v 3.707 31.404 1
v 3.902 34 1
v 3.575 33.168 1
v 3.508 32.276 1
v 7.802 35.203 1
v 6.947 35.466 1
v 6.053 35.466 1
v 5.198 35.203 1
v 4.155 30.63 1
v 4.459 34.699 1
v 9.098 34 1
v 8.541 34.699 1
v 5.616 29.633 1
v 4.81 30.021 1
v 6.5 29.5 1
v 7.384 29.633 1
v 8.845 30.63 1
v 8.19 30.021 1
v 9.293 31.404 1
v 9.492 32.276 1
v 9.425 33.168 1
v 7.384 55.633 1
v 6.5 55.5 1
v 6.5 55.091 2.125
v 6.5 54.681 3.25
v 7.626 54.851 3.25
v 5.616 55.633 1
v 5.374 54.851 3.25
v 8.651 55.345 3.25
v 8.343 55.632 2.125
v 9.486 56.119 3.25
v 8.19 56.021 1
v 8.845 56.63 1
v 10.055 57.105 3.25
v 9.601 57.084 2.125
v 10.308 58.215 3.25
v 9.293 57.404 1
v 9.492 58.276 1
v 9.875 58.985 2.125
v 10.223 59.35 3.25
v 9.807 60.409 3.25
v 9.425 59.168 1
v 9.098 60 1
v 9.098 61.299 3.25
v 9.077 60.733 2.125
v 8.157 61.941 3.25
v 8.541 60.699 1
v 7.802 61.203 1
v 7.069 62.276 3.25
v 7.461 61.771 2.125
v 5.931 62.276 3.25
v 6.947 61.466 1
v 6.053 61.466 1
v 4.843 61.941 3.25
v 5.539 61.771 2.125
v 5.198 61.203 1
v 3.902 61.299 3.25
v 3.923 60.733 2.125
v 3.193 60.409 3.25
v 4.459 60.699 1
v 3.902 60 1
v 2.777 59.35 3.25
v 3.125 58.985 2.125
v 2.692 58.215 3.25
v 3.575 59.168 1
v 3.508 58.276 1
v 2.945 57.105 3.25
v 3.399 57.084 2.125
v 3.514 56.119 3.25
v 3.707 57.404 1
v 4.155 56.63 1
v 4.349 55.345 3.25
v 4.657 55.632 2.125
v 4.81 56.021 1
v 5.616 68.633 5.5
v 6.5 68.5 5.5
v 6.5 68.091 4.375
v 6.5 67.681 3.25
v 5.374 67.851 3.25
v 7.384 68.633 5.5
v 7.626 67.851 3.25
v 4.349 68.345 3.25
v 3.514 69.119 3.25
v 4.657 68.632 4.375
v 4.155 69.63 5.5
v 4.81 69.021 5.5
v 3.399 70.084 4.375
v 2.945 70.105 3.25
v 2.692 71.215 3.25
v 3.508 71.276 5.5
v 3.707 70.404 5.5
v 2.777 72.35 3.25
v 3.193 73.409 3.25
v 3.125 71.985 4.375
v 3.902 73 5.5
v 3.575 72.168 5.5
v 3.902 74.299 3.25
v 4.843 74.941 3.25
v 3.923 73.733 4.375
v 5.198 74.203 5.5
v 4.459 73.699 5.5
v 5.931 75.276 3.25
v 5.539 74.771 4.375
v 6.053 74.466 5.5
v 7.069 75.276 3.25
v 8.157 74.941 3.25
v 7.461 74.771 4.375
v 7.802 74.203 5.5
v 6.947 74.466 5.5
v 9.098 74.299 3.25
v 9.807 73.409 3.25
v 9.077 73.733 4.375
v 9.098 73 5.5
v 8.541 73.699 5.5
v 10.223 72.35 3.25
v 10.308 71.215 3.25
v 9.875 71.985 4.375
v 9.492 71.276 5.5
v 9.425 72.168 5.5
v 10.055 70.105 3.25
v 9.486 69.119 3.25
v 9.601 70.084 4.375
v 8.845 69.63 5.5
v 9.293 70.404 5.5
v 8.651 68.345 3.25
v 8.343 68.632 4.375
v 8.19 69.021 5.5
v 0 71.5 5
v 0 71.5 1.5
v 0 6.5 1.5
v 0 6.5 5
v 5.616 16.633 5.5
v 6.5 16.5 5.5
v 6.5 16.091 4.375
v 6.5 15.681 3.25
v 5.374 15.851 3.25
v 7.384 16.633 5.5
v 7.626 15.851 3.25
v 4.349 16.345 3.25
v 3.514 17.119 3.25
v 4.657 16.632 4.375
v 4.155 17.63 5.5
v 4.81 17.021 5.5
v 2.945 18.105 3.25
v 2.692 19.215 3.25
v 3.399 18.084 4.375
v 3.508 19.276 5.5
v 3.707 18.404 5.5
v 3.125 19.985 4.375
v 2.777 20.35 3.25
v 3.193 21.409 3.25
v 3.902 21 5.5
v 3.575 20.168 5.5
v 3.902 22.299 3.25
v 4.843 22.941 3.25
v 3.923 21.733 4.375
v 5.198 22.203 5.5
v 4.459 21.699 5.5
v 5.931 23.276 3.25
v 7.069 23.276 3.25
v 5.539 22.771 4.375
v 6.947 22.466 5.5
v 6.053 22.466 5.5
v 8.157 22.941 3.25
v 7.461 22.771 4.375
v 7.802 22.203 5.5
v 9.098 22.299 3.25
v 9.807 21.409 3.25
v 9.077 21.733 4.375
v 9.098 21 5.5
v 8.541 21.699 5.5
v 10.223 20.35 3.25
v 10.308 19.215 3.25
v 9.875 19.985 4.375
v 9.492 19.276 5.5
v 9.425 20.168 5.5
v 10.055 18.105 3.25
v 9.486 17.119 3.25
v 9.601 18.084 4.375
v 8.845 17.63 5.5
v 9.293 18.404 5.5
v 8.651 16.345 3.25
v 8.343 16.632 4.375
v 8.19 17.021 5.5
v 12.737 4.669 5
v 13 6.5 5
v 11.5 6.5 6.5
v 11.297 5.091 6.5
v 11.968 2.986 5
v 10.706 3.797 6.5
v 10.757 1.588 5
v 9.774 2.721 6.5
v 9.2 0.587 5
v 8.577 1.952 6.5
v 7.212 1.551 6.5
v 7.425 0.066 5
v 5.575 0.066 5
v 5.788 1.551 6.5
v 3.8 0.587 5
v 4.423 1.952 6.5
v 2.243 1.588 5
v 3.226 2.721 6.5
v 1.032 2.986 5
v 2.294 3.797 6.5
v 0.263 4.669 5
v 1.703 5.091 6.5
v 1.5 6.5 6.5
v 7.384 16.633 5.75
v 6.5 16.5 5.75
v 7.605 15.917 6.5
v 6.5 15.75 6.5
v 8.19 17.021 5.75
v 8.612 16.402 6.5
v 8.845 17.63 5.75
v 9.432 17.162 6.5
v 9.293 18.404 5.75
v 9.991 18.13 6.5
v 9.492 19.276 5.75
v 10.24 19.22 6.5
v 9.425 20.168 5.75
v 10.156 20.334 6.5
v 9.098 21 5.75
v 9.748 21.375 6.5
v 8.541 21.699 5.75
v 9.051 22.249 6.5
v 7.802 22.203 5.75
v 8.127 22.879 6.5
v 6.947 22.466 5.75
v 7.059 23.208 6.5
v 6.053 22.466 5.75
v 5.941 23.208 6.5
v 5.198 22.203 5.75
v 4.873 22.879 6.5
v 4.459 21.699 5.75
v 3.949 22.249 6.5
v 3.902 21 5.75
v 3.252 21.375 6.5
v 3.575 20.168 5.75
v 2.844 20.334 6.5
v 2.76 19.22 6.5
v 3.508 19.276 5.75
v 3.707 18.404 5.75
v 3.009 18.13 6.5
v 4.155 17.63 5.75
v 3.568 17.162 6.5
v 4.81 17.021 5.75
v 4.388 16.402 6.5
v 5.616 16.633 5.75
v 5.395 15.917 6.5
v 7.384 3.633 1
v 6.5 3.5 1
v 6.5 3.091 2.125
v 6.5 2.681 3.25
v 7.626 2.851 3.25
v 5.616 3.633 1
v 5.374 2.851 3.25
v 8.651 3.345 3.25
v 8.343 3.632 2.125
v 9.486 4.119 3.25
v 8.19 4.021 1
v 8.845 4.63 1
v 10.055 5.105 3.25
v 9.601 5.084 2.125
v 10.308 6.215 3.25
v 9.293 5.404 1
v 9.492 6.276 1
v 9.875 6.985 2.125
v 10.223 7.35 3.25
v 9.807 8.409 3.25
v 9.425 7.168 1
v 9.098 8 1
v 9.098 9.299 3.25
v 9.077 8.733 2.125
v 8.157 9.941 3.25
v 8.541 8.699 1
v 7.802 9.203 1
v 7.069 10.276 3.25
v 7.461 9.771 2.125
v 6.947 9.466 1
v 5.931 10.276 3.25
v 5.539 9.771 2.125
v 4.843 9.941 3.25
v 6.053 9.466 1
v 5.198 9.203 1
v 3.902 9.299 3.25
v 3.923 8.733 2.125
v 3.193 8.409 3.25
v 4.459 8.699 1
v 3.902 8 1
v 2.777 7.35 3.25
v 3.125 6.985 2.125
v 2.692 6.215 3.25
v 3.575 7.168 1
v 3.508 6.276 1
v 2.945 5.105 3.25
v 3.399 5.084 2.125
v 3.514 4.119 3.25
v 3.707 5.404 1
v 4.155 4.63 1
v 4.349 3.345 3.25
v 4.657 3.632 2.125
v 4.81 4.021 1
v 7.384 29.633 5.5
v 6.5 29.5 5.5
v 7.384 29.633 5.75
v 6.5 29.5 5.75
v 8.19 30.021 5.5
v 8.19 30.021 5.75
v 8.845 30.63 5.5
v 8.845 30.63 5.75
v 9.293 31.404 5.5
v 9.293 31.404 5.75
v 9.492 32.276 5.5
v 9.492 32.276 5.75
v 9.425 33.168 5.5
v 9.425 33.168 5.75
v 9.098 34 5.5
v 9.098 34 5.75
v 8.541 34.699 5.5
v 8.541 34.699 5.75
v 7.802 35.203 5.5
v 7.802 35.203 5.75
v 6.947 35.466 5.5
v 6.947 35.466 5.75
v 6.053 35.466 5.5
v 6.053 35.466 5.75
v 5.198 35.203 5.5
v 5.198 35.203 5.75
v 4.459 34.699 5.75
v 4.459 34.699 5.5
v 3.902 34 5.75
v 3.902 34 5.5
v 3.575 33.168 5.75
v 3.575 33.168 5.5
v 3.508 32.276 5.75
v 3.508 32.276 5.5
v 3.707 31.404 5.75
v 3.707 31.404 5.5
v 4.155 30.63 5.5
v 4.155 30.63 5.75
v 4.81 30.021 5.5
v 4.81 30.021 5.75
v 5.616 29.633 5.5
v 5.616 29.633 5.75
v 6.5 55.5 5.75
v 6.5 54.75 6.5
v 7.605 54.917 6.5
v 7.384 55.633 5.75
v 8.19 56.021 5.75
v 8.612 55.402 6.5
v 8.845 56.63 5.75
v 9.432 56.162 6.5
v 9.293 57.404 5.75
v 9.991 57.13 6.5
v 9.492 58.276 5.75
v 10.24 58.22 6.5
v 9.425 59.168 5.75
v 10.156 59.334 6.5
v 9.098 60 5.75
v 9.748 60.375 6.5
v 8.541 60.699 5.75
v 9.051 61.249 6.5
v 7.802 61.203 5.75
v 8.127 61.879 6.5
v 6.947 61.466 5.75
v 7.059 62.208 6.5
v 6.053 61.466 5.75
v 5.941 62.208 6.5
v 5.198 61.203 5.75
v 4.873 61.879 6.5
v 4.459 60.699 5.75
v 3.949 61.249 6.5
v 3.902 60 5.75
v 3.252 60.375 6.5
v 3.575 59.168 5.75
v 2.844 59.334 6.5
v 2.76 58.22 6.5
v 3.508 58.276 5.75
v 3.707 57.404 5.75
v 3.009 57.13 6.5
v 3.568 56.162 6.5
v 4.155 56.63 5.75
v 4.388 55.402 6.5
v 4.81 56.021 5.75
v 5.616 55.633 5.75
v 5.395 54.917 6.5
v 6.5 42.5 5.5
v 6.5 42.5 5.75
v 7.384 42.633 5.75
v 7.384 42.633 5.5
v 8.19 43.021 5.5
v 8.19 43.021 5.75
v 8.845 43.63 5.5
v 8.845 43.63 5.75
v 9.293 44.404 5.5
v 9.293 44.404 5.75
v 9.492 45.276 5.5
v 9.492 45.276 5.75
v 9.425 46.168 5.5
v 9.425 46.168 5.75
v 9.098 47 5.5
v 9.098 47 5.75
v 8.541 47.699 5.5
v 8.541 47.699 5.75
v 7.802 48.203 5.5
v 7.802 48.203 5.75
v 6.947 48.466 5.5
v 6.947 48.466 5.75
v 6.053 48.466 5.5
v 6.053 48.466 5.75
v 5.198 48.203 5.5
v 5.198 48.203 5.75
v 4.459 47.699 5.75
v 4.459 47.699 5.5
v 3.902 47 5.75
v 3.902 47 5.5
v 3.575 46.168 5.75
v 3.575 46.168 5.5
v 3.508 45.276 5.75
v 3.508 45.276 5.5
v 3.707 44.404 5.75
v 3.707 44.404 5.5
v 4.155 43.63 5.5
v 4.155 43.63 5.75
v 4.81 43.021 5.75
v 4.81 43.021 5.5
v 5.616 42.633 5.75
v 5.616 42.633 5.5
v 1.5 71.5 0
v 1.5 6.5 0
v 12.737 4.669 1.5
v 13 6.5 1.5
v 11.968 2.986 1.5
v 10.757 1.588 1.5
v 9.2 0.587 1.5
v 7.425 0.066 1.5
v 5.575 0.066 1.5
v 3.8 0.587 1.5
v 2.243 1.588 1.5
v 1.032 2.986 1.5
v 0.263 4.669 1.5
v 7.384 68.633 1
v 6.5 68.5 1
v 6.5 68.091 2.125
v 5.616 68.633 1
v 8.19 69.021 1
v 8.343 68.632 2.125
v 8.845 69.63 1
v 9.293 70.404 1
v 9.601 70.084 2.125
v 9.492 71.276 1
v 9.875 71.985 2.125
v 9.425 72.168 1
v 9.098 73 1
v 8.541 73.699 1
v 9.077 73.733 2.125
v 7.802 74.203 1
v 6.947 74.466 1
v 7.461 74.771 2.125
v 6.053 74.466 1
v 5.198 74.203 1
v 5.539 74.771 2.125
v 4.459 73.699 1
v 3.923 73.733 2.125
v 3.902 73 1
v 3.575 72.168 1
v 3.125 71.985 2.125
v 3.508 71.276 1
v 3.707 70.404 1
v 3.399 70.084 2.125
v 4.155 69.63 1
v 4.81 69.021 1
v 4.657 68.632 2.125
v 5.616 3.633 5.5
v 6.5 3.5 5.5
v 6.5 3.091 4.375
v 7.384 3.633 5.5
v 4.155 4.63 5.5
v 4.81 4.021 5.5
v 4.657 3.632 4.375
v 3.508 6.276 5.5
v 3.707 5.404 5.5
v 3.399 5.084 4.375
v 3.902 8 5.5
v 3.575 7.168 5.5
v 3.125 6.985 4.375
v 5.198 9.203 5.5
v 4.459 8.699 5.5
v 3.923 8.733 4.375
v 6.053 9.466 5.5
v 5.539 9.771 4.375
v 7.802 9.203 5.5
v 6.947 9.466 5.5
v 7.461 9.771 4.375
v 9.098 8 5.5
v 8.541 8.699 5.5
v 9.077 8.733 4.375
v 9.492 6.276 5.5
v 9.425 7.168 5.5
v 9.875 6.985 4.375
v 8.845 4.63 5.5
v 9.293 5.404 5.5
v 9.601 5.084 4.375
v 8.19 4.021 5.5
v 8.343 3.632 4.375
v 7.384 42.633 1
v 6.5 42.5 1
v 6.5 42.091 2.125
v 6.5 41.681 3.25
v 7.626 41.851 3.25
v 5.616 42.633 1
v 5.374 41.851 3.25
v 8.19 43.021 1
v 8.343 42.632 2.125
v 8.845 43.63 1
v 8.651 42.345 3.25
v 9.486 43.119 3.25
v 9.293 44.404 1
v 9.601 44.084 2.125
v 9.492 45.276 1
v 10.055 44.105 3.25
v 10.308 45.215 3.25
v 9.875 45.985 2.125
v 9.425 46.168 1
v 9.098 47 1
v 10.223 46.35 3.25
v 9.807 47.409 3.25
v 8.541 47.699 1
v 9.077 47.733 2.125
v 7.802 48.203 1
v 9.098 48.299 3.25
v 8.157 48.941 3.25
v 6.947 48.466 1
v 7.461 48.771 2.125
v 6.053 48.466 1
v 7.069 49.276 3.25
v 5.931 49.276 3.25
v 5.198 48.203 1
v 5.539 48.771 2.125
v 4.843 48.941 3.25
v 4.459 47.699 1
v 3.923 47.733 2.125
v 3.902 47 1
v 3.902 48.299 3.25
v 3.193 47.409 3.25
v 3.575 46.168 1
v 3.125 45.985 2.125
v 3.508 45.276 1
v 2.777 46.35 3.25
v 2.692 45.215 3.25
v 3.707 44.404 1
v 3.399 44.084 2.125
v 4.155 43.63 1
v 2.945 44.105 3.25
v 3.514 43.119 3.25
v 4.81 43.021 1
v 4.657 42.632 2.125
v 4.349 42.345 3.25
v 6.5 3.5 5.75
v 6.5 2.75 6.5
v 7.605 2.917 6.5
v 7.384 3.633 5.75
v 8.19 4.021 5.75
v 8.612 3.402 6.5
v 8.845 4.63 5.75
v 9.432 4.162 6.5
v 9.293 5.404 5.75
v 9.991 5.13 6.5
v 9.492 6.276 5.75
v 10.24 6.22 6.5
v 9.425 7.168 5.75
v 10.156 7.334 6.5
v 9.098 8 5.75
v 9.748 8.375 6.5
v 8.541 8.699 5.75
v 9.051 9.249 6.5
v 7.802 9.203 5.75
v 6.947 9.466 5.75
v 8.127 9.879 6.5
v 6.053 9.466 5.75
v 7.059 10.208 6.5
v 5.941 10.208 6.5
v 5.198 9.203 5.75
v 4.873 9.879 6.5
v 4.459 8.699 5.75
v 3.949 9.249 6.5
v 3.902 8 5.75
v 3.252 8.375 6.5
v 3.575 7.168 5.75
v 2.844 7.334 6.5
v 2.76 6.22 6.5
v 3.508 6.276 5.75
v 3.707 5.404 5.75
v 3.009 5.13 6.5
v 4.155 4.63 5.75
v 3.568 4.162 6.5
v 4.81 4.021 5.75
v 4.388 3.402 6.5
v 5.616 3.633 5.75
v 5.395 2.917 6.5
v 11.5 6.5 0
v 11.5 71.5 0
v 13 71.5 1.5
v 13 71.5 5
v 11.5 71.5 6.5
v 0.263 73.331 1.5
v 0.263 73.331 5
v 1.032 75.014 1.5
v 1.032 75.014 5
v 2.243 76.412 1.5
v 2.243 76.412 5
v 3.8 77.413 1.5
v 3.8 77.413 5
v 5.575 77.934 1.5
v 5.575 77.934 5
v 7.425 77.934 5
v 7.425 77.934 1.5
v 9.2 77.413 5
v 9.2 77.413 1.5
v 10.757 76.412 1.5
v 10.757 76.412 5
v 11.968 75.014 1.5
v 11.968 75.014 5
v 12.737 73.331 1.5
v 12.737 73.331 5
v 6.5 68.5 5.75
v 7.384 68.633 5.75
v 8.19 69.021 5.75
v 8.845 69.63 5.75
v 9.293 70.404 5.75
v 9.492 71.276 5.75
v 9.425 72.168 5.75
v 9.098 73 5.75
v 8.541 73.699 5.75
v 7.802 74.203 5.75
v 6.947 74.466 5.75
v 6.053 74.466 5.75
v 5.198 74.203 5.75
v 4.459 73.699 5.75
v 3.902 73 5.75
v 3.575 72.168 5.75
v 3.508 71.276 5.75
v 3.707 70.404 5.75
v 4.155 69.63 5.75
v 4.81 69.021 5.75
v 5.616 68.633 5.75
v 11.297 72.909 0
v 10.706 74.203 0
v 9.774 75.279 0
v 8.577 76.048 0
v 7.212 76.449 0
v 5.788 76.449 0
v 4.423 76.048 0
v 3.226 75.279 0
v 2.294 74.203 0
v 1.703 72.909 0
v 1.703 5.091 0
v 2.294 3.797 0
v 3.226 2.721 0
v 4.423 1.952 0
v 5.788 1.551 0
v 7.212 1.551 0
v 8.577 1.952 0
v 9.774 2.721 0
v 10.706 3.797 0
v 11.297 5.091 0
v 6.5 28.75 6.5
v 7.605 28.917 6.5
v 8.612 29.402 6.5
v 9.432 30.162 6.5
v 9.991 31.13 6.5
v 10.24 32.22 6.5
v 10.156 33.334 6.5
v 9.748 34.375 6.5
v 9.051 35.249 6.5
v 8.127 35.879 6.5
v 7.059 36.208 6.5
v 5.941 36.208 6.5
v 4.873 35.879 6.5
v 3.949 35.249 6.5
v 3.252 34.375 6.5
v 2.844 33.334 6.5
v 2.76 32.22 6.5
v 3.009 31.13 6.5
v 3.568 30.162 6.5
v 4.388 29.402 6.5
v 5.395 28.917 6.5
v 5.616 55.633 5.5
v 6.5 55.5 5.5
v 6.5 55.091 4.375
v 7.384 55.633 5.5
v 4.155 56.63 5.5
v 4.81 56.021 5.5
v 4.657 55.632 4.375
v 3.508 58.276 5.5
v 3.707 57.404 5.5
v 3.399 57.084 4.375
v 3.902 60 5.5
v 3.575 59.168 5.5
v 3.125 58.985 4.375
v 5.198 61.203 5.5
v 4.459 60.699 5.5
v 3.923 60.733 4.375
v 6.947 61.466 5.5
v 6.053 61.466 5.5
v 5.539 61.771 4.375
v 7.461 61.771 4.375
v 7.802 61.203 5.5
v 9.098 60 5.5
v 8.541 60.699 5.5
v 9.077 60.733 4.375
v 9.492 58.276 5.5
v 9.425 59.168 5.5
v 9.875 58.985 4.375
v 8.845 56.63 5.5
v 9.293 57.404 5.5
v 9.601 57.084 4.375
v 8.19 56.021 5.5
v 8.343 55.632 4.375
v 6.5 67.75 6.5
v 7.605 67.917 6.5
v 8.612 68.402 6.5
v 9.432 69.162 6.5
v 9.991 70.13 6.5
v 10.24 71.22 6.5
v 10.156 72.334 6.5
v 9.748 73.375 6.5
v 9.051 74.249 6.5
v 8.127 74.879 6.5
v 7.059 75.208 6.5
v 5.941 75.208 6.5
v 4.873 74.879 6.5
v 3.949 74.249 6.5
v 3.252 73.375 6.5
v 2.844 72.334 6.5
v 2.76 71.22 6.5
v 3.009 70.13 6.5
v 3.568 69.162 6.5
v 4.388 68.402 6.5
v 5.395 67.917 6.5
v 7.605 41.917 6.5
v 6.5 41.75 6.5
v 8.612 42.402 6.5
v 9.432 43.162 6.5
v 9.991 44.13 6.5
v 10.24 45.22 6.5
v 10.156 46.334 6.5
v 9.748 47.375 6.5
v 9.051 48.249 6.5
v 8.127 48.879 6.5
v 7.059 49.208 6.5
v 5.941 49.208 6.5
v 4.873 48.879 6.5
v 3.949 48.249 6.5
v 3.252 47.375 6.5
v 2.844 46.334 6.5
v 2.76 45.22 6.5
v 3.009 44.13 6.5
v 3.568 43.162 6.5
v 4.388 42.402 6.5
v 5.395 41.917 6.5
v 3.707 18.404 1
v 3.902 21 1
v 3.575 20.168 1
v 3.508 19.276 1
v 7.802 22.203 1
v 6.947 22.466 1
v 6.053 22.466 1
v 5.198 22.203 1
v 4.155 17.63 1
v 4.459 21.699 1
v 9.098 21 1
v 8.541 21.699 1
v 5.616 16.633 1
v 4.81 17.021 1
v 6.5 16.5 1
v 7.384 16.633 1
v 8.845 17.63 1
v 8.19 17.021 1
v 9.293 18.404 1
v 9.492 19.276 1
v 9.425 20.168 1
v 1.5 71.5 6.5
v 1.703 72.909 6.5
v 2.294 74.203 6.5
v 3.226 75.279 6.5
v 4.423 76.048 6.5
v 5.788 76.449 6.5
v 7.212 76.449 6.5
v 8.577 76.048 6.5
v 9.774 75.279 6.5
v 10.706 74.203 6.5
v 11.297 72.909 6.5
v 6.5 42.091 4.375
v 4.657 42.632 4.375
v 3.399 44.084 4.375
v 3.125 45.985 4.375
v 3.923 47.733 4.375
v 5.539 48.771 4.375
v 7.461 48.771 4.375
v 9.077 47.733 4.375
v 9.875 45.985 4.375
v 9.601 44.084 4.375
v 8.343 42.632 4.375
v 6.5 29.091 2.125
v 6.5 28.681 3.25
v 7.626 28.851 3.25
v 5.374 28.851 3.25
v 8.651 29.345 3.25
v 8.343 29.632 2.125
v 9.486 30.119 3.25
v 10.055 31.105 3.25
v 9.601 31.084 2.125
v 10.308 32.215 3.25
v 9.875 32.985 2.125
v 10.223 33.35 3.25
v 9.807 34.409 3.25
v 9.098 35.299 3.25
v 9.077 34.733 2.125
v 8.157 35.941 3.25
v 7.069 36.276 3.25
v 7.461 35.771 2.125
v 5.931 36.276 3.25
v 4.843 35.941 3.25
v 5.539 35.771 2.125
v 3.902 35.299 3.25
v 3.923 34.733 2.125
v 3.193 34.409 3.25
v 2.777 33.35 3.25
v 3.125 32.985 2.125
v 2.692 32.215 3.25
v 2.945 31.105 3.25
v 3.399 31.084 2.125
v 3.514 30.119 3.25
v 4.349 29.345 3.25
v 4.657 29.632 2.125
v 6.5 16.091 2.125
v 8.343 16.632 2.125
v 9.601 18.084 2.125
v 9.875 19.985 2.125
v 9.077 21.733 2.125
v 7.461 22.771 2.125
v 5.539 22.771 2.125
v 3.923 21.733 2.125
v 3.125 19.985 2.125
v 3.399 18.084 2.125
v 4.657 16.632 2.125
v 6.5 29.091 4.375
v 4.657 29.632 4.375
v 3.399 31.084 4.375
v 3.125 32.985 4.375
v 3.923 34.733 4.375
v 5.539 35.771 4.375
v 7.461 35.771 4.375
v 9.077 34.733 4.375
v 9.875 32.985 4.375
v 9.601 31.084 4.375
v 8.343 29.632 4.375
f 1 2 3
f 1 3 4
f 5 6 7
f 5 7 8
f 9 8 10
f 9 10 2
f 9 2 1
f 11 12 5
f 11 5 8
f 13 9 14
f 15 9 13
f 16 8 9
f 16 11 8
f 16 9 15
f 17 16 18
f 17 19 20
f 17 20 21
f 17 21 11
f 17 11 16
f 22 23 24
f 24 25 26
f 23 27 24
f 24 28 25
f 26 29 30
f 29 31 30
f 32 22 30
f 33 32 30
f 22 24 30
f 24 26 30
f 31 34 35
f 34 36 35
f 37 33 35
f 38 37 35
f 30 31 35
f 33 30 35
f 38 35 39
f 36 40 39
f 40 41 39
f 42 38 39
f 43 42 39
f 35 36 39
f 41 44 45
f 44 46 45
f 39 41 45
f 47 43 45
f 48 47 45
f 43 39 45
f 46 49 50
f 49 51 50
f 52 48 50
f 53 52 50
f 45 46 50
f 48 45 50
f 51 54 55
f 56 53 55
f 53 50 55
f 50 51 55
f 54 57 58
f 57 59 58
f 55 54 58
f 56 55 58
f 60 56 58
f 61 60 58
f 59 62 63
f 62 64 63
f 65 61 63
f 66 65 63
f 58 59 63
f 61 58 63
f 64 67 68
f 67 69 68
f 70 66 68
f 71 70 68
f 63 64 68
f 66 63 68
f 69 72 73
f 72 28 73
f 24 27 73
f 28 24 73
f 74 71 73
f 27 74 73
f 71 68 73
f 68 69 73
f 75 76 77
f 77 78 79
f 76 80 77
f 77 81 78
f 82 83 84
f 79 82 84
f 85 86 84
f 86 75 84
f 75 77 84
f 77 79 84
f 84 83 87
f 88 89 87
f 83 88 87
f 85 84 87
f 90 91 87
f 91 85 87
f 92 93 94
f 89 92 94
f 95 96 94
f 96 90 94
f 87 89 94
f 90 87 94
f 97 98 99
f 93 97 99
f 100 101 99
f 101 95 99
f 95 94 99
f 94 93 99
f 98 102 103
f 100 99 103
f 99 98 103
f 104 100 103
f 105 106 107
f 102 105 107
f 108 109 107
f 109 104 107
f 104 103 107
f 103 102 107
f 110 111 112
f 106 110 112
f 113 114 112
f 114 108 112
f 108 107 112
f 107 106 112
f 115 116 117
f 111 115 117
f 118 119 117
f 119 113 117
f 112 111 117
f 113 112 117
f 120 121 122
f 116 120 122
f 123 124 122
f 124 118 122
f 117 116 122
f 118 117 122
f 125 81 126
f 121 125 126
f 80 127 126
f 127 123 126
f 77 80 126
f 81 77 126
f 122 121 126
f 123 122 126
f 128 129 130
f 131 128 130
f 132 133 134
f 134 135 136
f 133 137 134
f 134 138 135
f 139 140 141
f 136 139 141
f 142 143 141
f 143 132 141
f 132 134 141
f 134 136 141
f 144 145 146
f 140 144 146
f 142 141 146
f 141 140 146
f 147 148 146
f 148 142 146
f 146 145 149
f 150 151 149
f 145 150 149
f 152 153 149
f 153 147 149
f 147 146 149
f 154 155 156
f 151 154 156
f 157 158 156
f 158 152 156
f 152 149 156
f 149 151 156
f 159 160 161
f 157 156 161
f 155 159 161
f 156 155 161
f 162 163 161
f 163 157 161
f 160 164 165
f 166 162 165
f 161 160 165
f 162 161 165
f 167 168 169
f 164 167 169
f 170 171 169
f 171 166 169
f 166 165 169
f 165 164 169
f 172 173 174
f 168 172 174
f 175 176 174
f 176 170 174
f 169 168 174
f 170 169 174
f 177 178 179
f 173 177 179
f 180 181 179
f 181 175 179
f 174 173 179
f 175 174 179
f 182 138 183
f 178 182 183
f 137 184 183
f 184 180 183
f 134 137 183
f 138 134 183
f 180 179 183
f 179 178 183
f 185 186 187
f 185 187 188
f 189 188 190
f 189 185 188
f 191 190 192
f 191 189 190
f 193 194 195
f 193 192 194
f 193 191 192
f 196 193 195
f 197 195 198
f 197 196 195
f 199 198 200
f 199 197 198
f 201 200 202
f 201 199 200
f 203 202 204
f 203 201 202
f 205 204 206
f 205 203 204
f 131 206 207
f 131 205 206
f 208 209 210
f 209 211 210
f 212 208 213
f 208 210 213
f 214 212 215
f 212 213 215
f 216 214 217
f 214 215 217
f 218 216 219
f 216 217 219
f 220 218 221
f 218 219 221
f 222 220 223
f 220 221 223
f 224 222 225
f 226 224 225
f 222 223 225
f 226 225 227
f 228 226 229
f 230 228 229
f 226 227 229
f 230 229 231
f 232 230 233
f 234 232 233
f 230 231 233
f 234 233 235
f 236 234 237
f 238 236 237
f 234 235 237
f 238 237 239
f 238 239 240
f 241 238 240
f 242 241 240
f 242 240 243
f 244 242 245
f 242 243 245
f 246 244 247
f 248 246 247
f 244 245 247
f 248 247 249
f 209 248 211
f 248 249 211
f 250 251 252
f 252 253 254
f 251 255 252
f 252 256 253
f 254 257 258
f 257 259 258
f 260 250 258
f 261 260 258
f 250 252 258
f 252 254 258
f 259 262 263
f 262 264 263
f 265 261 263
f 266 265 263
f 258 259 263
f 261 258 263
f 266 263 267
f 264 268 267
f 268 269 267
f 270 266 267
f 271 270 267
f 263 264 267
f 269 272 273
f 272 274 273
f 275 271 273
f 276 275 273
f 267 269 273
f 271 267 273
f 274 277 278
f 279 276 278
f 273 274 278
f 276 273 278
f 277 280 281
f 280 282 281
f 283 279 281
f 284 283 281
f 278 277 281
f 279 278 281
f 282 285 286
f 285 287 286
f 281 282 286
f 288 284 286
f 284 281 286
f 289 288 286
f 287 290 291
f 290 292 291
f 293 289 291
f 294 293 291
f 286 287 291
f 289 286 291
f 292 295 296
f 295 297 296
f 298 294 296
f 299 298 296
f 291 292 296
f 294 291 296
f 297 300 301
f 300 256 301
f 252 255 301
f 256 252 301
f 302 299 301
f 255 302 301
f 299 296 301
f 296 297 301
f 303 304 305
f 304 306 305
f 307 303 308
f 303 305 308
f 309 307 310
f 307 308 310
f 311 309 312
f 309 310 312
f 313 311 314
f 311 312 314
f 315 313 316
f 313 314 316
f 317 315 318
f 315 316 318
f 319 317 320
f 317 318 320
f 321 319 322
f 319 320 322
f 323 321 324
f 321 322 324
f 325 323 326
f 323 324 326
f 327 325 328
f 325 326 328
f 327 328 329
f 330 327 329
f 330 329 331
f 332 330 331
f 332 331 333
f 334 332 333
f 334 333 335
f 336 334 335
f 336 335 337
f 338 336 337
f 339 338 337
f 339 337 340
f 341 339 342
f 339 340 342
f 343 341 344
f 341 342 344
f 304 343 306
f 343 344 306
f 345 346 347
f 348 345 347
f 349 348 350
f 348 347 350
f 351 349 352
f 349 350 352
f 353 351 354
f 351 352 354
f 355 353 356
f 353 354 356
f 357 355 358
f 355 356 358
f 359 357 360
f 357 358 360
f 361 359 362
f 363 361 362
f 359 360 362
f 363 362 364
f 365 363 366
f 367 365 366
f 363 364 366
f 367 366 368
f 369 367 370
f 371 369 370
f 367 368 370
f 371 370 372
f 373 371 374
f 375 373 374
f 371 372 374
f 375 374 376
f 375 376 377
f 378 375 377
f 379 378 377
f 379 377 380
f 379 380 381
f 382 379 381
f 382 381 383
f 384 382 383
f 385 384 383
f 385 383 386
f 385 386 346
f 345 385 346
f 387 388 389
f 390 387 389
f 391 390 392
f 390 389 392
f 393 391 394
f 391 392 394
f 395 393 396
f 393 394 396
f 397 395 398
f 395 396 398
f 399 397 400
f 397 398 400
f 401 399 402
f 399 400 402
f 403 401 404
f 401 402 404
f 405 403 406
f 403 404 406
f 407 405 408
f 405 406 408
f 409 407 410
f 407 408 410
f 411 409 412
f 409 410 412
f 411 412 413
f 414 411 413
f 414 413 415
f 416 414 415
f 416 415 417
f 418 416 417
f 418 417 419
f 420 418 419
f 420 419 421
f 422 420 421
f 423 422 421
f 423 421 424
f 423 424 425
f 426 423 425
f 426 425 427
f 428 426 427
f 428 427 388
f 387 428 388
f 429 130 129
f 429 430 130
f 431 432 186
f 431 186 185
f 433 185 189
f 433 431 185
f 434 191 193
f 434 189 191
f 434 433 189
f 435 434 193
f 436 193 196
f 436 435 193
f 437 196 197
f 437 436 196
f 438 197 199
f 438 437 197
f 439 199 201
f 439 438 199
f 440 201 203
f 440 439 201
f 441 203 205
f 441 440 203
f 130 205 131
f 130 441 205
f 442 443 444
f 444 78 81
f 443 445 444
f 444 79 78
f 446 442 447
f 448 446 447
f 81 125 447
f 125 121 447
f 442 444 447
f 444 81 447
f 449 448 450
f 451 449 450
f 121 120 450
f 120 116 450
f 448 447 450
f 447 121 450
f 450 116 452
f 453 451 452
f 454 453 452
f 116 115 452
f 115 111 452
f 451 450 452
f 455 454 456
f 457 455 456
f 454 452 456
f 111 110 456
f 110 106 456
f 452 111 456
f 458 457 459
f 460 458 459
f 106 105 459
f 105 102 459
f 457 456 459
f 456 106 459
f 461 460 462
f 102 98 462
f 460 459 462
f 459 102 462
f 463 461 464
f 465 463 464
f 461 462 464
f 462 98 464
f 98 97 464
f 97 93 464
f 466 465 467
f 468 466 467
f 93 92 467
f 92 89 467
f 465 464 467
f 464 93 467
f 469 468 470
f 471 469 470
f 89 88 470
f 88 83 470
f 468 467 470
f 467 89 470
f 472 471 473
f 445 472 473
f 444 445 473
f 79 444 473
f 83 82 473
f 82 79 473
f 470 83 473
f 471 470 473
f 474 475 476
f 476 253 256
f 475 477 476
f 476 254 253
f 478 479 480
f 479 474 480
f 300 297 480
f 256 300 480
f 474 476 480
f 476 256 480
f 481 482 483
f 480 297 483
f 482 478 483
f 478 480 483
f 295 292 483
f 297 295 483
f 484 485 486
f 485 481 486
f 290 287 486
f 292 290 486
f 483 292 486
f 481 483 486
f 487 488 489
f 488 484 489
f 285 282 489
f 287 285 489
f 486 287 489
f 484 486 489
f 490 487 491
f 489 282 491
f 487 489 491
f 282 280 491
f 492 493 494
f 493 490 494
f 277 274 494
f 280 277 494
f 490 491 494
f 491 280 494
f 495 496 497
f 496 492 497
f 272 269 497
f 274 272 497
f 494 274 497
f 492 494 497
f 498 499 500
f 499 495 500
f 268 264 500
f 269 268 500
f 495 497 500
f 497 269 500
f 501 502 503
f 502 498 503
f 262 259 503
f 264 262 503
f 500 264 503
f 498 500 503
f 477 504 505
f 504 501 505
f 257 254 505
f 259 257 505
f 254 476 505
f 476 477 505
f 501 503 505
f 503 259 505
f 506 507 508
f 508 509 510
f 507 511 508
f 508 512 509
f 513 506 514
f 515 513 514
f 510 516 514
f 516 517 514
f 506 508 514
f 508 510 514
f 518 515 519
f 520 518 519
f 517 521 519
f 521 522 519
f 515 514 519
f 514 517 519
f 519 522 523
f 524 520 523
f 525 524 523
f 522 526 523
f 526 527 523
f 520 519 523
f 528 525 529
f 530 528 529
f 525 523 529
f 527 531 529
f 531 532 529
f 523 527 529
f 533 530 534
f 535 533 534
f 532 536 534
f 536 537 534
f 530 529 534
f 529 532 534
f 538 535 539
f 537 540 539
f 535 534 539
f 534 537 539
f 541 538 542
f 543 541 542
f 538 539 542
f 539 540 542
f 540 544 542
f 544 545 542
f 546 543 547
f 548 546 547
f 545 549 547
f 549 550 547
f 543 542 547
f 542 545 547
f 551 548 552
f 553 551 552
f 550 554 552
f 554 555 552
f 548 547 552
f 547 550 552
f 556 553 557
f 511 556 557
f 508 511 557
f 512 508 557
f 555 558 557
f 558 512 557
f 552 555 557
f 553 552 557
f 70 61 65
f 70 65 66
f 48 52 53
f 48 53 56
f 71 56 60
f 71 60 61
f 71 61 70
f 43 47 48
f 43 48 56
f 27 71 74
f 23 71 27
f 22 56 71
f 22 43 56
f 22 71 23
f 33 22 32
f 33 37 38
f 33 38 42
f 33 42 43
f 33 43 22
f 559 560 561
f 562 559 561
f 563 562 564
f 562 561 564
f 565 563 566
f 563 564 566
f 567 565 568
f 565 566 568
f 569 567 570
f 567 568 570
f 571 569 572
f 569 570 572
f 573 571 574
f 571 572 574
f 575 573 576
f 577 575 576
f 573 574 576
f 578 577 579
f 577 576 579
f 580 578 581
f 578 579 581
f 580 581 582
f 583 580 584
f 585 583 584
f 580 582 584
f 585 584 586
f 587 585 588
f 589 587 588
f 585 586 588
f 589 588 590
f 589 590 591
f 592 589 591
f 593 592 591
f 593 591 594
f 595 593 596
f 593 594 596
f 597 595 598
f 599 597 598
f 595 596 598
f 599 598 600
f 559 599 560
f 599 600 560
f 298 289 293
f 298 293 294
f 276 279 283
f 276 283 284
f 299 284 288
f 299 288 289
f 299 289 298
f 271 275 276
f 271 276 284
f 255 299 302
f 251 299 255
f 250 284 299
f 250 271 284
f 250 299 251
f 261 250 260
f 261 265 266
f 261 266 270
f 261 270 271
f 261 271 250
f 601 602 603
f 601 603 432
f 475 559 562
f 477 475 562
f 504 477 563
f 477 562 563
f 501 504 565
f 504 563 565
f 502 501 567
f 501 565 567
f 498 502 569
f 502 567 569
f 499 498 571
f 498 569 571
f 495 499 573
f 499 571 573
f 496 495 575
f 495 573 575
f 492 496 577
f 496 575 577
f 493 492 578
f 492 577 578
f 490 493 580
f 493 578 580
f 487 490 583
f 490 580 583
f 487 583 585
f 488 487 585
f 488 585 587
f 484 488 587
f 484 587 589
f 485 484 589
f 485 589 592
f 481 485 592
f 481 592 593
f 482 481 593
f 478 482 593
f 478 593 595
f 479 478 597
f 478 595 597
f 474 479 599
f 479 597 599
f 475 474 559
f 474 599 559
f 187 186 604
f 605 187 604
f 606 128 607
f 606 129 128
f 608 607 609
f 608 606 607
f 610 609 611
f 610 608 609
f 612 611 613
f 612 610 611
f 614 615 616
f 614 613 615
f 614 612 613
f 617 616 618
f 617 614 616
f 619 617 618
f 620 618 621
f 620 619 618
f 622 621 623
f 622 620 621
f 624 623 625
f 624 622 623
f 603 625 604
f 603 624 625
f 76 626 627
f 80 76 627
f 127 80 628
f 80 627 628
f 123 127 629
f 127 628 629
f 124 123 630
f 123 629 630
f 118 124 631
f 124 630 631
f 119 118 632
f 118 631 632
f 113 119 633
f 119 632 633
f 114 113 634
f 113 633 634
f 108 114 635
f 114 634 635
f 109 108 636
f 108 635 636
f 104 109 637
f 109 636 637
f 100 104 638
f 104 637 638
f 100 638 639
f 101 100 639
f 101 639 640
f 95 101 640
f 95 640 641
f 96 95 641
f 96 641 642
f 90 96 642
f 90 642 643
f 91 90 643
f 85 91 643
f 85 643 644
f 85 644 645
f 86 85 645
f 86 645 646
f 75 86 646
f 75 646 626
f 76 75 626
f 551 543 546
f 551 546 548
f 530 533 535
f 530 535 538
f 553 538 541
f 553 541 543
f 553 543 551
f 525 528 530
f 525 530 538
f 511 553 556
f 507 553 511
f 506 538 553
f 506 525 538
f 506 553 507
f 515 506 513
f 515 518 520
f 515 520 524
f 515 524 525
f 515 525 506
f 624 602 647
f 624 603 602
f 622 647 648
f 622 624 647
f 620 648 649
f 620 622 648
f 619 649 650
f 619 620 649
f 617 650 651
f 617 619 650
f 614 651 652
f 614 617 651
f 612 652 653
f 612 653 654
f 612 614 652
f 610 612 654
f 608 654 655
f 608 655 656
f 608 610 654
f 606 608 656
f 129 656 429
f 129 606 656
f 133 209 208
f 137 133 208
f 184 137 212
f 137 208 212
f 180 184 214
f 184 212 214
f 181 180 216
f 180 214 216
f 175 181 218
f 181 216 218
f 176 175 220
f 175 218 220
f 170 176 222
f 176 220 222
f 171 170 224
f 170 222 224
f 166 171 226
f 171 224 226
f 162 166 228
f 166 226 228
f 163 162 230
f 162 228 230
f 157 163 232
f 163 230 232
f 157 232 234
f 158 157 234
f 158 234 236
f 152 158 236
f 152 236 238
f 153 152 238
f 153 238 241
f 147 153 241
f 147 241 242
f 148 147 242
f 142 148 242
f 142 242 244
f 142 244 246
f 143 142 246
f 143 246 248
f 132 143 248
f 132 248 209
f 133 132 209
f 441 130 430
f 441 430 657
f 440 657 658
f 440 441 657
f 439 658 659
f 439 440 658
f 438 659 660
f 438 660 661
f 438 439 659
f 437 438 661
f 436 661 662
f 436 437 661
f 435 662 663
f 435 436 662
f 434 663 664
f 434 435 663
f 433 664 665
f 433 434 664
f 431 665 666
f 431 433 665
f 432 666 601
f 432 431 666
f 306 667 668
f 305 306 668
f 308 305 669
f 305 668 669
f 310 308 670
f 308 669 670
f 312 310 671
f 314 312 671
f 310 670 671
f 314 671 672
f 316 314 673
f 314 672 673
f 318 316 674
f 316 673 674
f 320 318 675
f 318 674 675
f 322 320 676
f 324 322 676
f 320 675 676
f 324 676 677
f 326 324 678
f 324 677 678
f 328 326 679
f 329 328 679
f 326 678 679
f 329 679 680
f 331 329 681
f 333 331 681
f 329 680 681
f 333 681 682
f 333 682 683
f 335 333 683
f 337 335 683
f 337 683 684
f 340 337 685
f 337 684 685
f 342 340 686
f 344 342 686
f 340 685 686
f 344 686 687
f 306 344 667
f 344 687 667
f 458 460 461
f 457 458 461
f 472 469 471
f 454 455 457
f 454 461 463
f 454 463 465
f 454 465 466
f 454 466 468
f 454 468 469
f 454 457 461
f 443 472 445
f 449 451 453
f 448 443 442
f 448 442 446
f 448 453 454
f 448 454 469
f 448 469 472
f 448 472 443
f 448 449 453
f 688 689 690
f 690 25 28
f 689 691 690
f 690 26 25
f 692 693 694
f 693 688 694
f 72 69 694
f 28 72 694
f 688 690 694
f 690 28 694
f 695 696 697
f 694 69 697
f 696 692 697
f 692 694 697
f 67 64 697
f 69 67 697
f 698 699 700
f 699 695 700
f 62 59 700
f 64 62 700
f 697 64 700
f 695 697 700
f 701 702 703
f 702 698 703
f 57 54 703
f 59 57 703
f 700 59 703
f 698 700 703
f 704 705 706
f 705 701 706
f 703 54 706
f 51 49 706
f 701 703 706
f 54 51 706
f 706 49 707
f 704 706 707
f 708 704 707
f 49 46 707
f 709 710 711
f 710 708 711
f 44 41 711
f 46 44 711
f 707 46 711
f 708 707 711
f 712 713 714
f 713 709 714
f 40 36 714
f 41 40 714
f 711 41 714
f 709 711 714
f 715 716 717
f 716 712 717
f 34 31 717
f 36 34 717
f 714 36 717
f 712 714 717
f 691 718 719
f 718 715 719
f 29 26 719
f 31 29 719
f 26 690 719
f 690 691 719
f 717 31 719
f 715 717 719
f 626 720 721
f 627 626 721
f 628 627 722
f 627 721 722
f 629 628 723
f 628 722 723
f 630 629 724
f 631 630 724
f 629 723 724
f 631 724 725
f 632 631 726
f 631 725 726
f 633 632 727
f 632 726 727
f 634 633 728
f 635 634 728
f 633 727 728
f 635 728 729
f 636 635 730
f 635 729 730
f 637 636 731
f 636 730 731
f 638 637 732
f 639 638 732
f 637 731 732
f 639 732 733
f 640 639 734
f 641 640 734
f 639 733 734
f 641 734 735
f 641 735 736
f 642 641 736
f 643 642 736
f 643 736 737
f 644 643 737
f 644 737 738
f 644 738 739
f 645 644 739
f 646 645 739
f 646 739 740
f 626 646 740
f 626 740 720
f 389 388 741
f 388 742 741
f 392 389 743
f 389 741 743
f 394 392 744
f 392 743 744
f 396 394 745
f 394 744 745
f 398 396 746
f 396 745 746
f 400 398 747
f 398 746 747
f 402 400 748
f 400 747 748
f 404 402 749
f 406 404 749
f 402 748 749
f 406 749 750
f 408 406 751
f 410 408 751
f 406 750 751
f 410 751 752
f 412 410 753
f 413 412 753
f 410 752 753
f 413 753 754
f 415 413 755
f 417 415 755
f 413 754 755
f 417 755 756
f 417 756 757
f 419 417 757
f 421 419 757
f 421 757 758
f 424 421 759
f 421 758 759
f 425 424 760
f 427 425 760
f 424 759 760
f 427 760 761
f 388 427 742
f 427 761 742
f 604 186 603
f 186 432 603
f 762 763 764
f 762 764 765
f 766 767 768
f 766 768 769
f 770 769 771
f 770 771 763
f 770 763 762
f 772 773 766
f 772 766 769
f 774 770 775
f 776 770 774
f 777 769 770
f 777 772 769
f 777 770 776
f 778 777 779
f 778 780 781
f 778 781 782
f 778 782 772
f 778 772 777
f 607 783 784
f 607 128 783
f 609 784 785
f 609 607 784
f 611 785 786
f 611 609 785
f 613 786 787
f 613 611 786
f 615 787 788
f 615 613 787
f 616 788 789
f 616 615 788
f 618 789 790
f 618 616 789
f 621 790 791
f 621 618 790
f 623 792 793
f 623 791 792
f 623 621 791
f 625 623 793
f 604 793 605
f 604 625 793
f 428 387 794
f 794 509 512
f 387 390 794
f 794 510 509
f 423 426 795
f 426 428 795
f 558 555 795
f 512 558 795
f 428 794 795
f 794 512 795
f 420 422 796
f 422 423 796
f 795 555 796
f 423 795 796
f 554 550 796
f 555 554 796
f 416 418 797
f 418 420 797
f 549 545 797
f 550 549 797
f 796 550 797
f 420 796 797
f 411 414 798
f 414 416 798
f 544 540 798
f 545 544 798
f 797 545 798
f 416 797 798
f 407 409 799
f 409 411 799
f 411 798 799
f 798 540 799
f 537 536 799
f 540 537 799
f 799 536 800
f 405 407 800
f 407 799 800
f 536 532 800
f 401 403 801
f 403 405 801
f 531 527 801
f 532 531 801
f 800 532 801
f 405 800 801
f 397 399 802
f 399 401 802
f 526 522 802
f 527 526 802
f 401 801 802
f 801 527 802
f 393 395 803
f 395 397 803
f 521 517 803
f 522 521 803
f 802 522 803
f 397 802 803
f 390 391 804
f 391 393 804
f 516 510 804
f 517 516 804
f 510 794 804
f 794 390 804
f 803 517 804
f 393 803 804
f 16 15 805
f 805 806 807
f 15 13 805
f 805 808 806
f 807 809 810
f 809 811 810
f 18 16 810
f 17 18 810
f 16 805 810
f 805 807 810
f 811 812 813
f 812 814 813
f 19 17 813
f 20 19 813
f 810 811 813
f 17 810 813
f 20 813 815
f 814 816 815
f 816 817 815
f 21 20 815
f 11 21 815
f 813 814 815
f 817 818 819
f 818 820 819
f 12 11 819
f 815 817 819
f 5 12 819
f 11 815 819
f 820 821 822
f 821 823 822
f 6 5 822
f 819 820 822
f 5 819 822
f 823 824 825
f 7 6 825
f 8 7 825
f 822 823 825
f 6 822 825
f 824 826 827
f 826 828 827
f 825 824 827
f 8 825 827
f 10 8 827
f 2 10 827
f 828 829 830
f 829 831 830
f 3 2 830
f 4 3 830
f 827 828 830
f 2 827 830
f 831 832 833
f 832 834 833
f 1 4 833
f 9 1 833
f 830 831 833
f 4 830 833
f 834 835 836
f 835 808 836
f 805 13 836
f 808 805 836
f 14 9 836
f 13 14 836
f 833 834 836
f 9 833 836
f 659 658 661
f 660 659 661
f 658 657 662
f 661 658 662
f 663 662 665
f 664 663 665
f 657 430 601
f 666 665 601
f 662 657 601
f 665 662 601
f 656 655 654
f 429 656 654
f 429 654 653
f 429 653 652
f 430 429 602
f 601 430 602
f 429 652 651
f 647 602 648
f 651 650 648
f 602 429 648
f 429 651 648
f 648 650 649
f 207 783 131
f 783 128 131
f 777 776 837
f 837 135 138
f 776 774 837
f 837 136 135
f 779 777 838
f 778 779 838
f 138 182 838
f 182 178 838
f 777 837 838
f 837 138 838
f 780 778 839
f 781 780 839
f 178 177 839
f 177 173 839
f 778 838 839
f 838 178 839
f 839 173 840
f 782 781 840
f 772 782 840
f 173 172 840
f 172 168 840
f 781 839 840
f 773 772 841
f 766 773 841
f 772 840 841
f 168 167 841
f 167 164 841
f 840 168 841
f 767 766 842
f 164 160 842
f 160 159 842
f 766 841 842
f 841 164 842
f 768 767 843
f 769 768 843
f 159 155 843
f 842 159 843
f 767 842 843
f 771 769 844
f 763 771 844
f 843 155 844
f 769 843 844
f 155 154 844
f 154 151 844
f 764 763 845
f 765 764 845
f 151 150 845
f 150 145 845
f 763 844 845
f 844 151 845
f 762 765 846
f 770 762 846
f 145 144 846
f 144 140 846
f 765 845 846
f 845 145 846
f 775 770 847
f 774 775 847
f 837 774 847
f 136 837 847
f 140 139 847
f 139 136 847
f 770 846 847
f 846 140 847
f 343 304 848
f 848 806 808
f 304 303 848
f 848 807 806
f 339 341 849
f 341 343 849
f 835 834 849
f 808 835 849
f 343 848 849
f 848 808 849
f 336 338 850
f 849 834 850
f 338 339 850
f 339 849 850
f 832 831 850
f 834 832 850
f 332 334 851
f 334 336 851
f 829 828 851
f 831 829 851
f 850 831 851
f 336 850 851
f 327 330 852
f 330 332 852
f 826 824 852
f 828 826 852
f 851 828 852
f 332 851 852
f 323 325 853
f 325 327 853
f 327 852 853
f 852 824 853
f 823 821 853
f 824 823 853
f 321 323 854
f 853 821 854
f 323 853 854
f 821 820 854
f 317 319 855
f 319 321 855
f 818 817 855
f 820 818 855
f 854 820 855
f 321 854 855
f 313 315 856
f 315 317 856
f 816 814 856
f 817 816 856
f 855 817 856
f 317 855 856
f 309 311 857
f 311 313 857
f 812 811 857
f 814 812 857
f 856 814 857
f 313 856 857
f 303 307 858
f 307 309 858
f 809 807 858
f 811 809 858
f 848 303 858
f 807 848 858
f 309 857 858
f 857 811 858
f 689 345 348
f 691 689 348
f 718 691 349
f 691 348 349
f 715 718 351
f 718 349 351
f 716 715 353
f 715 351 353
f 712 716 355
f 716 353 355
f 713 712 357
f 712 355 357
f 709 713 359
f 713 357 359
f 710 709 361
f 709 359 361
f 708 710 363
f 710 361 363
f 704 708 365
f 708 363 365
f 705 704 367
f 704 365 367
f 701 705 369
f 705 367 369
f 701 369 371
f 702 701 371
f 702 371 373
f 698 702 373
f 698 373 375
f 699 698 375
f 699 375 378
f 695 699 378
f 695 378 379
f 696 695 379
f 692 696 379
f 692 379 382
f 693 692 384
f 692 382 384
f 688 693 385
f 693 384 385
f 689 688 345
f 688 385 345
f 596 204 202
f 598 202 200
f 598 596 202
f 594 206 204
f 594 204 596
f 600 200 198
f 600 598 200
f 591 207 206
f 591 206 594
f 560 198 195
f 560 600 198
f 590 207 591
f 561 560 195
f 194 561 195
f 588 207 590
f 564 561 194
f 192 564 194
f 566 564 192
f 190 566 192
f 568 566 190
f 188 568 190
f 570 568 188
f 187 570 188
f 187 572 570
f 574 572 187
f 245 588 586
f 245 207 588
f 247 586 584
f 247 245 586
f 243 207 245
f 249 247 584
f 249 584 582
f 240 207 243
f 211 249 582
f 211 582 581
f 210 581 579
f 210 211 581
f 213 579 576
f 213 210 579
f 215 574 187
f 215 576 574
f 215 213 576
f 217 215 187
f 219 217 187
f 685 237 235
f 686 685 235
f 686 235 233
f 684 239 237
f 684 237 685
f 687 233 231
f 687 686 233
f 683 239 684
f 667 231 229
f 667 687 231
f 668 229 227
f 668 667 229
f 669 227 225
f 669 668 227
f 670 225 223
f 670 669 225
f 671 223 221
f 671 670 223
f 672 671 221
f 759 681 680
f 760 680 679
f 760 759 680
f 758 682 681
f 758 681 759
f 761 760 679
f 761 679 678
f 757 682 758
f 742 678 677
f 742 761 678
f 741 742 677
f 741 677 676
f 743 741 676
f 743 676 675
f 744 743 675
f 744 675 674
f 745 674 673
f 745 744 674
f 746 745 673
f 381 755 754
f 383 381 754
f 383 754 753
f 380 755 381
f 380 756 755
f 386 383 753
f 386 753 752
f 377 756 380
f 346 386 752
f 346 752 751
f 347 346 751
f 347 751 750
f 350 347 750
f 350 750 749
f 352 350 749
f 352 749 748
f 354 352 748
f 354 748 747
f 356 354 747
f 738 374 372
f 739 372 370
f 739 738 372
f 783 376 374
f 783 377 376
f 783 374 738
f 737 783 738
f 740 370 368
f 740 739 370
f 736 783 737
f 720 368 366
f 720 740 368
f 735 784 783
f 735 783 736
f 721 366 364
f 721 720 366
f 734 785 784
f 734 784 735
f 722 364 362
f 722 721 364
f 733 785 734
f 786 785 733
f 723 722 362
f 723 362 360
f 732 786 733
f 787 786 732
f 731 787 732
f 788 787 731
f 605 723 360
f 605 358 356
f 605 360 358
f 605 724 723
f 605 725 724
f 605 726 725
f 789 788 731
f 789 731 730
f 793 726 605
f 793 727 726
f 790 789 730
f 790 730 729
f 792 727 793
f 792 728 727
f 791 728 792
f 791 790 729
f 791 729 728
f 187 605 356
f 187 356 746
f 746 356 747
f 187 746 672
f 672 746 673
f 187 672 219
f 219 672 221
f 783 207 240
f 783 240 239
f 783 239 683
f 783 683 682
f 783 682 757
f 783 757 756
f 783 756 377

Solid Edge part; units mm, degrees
sketch "Sketch1" plane through (0, 0, 0) normal (0, 0, 1) x (1, 0, 0)
  line L0 (0, 71.5) -> (0, 6.5)
  line L1 (13, 6.5) -> (13, 71.5)
  arc A0 (13, 6.5) -> (0, 6.5) centre (6.5, 6.5) cw
  arc A1 (0, 71.5) -> (13, 71.5) centre (6.5, 71.5) cw
extrude "Protrusion1" add sketch "Sketch1" along normal blind 6.5
sketch "Sketch2" plane through (6.5, 0, 0) normal (1, 0, 0) x (0, 1, 0)
  line L0 (3.5, 5.5) -> (3.5, 6.5)
  line L1 (3.5, 6.5) -> (6.5, 6.5)
  line L2 (6.5, 1) -> (6.5, 6.5)
  line L3 (3.5, 1) -> (6.5, 1)
  line L4 (3.5, 1) -> (2.6811, 3.25)
  line L5 (3.5, 5.5) -> (2.6811, 3.25)
revolve "RevolvedCutout1" cut sketch "Sketch2" angle 360 about axis through (6.5, 6.5, 1) along (0, 0, 1)
chamfer "Chaflán_38" distance 0.75 angle 45 1 edges at (6.5, 3.5, 6.5)
pattern_linear "Pattern1" count 6 spacing 13 along (0, 1, 0) of "RevolvedCutout1", "Chaflán_38"
chamfer "Chaflán_39" distance 1.5 angle 45 8 edges at (13, 39, 6.5) (6.5, 0, 6.5) (0, 39, 6.5) (6.5, 78, 6.5) (13, 39, 0) (6.5, 0, 0) (0, 39, 0) (6.5, 78, 0)
